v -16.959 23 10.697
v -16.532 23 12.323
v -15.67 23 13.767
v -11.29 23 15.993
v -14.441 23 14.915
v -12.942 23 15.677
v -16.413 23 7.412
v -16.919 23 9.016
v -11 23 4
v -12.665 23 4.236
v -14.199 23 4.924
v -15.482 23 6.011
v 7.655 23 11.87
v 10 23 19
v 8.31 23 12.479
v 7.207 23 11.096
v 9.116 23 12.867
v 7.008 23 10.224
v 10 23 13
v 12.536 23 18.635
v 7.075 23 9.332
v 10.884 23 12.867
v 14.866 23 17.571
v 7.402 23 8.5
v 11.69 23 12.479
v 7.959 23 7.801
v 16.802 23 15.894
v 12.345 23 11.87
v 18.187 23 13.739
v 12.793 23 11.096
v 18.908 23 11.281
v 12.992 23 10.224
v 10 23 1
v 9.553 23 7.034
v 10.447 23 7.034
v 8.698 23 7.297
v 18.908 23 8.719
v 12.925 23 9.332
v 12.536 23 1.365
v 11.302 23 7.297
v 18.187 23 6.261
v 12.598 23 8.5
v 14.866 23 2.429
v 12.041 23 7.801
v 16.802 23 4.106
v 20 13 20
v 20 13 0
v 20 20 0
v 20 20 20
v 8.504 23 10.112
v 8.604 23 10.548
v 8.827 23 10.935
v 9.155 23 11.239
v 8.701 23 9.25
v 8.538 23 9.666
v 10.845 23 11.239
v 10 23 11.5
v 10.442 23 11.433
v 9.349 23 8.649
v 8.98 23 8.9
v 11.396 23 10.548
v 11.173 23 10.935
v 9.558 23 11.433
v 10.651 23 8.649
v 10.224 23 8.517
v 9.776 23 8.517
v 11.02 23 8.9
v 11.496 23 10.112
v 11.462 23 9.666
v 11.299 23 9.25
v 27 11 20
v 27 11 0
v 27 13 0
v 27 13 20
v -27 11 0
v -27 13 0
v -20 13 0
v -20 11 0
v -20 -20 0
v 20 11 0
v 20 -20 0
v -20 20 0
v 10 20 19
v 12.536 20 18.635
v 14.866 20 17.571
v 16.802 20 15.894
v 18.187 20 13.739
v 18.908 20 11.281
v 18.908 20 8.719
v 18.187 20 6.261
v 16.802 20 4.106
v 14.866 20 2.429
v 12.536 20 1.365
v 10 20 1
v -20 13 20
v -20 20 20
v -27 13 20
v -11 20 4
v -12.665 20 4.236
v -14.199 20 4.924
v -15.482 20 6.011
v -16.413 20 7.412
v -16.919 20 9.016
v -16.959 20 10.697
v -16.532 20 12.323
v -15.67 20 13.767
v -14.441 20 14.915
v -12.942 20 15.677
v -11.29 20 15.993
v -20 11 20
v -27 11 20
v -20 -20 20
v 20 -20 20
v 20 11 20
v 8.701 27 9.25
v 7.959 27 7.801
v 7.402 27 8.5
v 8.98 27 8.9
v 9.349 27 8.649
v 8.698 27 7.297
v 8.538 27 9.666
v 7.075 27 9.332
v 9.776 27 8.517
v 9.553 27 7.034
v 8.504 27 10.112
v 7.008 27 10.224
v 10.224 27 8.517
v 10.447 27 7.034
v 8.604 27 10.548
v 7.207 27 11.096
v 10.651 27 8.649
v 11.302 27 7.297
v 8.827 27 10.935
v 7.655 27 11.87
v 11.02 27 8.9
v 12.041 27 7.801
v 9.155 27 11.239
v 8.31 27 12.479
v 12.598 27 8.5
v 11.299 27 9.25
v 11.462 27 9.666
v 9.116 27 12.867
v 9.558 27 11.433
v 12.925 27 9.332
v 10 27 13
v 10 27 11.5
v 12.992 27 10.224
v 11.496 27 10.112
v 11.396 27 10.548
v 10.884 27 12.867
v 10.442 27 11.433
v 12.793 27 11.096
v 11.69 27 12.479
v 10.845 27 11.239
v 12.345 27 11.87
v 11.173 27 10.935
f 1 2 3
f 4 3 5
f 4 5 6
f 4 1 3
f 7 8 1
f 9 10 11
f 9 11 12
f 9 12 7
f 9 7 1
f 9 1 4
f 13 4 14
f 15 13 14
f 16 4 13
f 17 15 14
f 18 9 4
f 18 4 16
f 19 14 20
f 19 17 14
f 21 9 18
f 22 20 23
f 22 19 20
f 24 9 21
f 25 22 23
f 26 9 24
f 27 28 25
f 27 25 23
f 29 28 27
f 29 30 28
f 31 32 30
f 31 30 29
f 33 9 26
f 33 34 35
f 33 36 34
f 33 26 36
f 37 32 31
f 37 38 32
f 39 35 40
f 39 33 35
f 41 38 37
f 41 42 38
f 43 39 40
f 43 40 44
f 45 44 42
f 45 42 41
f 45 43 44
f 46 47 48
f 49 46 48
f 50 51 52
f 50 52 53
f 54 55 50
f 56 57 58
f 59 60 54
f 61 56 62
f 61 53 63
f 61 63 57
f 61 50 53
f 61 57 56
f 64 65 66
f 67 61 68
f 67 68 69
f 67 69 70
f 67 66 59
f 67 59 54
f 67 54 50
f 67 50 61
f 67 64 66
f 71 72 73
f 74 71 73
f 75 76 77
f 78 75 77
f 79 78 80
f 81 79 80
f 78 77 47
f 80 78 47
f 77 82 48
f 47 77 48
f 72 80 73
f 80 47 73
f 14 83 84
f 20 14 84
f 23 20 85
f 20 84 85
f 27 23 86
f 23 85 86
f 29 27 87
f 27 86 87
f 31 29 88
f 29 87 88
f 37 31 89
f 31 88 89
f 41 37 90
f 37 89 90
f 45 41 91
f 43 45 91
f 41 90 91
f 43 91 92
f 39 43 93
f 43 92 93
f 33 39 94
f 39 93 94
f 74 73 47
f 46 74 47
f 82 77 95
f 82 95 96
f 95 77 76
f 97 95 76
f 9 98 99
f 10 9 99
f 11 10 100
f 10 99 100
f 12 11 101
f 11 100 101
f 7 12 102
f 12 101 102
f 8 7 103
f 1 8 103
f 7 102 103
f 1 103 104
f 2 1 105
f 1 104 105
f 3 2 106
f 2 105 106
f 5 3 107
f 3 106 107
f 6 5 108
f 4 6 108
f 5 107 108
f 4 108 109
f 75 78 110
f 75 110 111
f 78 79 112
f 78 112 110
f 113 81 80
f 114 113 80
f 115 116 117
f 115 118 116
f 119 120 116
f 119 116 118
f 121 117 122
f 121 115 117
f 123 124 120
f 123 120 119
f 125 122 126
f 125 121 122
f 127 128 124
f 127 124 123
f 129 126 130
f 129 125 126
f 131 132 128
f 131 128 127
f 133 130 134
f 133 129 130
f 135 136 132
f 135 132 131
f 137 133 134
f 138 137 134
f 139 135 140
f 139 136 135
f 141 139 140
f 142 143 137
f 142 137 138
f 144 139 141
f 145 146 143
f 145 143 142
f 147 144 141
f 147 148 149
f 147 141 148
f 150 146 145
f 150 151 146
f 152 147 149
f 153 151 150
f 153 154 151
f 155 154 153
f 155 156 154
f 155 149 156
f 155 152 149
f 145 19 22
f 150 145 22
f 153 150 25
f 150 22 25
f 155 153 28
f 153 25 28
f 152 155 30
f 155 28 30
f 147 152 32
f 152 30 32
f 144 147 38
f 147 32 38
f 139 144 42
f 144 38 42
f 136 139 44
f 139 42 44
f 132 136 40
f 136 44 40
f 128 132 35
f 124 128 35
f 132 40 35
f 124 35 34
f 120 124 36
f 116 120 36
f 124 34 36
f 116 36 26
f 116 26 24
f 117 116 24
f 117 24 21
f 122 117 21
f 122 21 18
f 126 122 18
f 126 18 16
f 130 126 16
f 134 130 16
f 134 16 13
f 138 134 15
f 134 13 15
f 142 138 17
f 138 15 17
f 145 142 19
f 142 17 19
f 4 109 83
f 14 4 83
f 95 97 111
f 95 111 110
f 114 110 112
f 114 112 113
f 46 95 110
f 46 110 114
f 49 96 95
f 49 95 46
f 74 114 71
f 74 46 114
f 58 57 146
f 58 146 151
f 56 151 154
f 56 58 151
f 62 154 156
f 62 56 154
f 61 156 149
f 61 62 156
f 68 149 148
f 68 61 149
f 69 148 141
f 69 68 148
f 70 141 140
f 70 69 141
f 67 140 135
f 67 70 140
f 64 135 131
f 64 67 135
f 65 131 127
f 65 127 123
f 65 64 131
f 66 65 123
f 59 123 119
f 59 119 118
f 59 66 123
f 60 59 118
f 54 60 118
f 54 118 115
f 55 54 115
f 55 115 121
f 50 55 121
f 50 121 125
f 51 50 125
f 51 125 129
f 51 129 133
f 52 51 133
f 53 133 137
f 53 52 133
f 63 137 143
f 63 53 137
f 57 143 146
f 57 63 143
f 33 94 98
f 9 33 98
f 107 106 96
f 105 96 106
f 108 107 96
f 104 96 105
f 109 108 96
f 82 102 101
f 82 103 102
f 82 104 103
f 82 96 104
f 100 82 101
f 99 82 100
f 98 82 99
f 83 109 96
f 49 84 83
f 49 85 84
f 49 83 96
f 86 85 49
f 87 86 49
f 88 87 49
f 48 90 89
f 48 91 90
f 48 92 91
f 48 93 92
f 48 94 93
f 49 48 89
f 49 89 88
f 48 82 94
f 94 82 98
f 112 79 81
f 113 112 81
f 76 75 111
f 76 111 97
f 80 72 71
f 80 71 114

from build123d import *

# Parameters (mm, degrees)
SKETCH_1_W      = 40
SKETCH_1_H      = 40
EXTRUDE_1_DEPTH = 20
EXTRUDE_2_DEPTH = 3
SKETCH_5_R      = 3
SKETCH_5_R_2    = 1.5
EXTRUDE_3_DEPTH = 4
SKETCH_6_W      = 7
SKETCH_6_H      = 2
EXTRUDE_4_DEPTH = 20


with BuildPart() as part:
    # 草图1 → 凸台-拉伸1 (new body)
    with BuildSketch(Plane.XY):
        Rectangle(SKETCH_1_W, SKETCH_1_H)
    extrude(amount=EXTRUDE_1_DEPTH)

    # 草图2 → 凸台-拉伸2 (add)
    with BuildSketch(Plane(origin=(0, 20, 0), x_dir=(1, 0, 0), z_dir=(0, 1, 0))):
        with BuildLine():
            Line((10, -1), (-11, -4))
            ThreePointArc((-11, -4), (-16.99824603, -9.854932566), (-11.290050053, -15.992985147))
            Line((-11.290050053, -15.992985147), (10, -19))
            ThreePointArc((10, -19), (19, -10), (10, -1))
        make_face()
    extrude(amount=EXTRUDE_2_DEPTH)

    # 草图5 → 凸台-拉伸3 (add)
    with BuildSketch(Plane(origin=(0, 23, 0), x_dir=(1, 0, 0), z_dir=(0, 1, 0))):
        with Locations(Location((10, -10, 0), (0, 0, 270))):
            Circle(SKETCH_5_R)
        with Locations(Location((10, -10, 0), (0, 0, 270))):
            Circle(SKETCH_5_R_2, mode=Mode.SUBTRACT)
    extrude(amount=EXTRUDE_3_DEPTH)

    # 草图6 → 凸台-拉伸4 (add)
    with BuildSketch(Plane(origin=(0, 0, 0), x_dir=(-1, 0, 0), z_dir=(0, 0, -1))):
        with Locations((-23.5, 12)):
            Rectangle(SKETCH_6_W, SKETCH_6_H)
        with Locations((23.5, 12)):
            Rectangle(SKETCH_6_W, SKETCH_6_H)
    extrude(amount=-EXTRUDE_4_DEPTH)


solid = part.part
